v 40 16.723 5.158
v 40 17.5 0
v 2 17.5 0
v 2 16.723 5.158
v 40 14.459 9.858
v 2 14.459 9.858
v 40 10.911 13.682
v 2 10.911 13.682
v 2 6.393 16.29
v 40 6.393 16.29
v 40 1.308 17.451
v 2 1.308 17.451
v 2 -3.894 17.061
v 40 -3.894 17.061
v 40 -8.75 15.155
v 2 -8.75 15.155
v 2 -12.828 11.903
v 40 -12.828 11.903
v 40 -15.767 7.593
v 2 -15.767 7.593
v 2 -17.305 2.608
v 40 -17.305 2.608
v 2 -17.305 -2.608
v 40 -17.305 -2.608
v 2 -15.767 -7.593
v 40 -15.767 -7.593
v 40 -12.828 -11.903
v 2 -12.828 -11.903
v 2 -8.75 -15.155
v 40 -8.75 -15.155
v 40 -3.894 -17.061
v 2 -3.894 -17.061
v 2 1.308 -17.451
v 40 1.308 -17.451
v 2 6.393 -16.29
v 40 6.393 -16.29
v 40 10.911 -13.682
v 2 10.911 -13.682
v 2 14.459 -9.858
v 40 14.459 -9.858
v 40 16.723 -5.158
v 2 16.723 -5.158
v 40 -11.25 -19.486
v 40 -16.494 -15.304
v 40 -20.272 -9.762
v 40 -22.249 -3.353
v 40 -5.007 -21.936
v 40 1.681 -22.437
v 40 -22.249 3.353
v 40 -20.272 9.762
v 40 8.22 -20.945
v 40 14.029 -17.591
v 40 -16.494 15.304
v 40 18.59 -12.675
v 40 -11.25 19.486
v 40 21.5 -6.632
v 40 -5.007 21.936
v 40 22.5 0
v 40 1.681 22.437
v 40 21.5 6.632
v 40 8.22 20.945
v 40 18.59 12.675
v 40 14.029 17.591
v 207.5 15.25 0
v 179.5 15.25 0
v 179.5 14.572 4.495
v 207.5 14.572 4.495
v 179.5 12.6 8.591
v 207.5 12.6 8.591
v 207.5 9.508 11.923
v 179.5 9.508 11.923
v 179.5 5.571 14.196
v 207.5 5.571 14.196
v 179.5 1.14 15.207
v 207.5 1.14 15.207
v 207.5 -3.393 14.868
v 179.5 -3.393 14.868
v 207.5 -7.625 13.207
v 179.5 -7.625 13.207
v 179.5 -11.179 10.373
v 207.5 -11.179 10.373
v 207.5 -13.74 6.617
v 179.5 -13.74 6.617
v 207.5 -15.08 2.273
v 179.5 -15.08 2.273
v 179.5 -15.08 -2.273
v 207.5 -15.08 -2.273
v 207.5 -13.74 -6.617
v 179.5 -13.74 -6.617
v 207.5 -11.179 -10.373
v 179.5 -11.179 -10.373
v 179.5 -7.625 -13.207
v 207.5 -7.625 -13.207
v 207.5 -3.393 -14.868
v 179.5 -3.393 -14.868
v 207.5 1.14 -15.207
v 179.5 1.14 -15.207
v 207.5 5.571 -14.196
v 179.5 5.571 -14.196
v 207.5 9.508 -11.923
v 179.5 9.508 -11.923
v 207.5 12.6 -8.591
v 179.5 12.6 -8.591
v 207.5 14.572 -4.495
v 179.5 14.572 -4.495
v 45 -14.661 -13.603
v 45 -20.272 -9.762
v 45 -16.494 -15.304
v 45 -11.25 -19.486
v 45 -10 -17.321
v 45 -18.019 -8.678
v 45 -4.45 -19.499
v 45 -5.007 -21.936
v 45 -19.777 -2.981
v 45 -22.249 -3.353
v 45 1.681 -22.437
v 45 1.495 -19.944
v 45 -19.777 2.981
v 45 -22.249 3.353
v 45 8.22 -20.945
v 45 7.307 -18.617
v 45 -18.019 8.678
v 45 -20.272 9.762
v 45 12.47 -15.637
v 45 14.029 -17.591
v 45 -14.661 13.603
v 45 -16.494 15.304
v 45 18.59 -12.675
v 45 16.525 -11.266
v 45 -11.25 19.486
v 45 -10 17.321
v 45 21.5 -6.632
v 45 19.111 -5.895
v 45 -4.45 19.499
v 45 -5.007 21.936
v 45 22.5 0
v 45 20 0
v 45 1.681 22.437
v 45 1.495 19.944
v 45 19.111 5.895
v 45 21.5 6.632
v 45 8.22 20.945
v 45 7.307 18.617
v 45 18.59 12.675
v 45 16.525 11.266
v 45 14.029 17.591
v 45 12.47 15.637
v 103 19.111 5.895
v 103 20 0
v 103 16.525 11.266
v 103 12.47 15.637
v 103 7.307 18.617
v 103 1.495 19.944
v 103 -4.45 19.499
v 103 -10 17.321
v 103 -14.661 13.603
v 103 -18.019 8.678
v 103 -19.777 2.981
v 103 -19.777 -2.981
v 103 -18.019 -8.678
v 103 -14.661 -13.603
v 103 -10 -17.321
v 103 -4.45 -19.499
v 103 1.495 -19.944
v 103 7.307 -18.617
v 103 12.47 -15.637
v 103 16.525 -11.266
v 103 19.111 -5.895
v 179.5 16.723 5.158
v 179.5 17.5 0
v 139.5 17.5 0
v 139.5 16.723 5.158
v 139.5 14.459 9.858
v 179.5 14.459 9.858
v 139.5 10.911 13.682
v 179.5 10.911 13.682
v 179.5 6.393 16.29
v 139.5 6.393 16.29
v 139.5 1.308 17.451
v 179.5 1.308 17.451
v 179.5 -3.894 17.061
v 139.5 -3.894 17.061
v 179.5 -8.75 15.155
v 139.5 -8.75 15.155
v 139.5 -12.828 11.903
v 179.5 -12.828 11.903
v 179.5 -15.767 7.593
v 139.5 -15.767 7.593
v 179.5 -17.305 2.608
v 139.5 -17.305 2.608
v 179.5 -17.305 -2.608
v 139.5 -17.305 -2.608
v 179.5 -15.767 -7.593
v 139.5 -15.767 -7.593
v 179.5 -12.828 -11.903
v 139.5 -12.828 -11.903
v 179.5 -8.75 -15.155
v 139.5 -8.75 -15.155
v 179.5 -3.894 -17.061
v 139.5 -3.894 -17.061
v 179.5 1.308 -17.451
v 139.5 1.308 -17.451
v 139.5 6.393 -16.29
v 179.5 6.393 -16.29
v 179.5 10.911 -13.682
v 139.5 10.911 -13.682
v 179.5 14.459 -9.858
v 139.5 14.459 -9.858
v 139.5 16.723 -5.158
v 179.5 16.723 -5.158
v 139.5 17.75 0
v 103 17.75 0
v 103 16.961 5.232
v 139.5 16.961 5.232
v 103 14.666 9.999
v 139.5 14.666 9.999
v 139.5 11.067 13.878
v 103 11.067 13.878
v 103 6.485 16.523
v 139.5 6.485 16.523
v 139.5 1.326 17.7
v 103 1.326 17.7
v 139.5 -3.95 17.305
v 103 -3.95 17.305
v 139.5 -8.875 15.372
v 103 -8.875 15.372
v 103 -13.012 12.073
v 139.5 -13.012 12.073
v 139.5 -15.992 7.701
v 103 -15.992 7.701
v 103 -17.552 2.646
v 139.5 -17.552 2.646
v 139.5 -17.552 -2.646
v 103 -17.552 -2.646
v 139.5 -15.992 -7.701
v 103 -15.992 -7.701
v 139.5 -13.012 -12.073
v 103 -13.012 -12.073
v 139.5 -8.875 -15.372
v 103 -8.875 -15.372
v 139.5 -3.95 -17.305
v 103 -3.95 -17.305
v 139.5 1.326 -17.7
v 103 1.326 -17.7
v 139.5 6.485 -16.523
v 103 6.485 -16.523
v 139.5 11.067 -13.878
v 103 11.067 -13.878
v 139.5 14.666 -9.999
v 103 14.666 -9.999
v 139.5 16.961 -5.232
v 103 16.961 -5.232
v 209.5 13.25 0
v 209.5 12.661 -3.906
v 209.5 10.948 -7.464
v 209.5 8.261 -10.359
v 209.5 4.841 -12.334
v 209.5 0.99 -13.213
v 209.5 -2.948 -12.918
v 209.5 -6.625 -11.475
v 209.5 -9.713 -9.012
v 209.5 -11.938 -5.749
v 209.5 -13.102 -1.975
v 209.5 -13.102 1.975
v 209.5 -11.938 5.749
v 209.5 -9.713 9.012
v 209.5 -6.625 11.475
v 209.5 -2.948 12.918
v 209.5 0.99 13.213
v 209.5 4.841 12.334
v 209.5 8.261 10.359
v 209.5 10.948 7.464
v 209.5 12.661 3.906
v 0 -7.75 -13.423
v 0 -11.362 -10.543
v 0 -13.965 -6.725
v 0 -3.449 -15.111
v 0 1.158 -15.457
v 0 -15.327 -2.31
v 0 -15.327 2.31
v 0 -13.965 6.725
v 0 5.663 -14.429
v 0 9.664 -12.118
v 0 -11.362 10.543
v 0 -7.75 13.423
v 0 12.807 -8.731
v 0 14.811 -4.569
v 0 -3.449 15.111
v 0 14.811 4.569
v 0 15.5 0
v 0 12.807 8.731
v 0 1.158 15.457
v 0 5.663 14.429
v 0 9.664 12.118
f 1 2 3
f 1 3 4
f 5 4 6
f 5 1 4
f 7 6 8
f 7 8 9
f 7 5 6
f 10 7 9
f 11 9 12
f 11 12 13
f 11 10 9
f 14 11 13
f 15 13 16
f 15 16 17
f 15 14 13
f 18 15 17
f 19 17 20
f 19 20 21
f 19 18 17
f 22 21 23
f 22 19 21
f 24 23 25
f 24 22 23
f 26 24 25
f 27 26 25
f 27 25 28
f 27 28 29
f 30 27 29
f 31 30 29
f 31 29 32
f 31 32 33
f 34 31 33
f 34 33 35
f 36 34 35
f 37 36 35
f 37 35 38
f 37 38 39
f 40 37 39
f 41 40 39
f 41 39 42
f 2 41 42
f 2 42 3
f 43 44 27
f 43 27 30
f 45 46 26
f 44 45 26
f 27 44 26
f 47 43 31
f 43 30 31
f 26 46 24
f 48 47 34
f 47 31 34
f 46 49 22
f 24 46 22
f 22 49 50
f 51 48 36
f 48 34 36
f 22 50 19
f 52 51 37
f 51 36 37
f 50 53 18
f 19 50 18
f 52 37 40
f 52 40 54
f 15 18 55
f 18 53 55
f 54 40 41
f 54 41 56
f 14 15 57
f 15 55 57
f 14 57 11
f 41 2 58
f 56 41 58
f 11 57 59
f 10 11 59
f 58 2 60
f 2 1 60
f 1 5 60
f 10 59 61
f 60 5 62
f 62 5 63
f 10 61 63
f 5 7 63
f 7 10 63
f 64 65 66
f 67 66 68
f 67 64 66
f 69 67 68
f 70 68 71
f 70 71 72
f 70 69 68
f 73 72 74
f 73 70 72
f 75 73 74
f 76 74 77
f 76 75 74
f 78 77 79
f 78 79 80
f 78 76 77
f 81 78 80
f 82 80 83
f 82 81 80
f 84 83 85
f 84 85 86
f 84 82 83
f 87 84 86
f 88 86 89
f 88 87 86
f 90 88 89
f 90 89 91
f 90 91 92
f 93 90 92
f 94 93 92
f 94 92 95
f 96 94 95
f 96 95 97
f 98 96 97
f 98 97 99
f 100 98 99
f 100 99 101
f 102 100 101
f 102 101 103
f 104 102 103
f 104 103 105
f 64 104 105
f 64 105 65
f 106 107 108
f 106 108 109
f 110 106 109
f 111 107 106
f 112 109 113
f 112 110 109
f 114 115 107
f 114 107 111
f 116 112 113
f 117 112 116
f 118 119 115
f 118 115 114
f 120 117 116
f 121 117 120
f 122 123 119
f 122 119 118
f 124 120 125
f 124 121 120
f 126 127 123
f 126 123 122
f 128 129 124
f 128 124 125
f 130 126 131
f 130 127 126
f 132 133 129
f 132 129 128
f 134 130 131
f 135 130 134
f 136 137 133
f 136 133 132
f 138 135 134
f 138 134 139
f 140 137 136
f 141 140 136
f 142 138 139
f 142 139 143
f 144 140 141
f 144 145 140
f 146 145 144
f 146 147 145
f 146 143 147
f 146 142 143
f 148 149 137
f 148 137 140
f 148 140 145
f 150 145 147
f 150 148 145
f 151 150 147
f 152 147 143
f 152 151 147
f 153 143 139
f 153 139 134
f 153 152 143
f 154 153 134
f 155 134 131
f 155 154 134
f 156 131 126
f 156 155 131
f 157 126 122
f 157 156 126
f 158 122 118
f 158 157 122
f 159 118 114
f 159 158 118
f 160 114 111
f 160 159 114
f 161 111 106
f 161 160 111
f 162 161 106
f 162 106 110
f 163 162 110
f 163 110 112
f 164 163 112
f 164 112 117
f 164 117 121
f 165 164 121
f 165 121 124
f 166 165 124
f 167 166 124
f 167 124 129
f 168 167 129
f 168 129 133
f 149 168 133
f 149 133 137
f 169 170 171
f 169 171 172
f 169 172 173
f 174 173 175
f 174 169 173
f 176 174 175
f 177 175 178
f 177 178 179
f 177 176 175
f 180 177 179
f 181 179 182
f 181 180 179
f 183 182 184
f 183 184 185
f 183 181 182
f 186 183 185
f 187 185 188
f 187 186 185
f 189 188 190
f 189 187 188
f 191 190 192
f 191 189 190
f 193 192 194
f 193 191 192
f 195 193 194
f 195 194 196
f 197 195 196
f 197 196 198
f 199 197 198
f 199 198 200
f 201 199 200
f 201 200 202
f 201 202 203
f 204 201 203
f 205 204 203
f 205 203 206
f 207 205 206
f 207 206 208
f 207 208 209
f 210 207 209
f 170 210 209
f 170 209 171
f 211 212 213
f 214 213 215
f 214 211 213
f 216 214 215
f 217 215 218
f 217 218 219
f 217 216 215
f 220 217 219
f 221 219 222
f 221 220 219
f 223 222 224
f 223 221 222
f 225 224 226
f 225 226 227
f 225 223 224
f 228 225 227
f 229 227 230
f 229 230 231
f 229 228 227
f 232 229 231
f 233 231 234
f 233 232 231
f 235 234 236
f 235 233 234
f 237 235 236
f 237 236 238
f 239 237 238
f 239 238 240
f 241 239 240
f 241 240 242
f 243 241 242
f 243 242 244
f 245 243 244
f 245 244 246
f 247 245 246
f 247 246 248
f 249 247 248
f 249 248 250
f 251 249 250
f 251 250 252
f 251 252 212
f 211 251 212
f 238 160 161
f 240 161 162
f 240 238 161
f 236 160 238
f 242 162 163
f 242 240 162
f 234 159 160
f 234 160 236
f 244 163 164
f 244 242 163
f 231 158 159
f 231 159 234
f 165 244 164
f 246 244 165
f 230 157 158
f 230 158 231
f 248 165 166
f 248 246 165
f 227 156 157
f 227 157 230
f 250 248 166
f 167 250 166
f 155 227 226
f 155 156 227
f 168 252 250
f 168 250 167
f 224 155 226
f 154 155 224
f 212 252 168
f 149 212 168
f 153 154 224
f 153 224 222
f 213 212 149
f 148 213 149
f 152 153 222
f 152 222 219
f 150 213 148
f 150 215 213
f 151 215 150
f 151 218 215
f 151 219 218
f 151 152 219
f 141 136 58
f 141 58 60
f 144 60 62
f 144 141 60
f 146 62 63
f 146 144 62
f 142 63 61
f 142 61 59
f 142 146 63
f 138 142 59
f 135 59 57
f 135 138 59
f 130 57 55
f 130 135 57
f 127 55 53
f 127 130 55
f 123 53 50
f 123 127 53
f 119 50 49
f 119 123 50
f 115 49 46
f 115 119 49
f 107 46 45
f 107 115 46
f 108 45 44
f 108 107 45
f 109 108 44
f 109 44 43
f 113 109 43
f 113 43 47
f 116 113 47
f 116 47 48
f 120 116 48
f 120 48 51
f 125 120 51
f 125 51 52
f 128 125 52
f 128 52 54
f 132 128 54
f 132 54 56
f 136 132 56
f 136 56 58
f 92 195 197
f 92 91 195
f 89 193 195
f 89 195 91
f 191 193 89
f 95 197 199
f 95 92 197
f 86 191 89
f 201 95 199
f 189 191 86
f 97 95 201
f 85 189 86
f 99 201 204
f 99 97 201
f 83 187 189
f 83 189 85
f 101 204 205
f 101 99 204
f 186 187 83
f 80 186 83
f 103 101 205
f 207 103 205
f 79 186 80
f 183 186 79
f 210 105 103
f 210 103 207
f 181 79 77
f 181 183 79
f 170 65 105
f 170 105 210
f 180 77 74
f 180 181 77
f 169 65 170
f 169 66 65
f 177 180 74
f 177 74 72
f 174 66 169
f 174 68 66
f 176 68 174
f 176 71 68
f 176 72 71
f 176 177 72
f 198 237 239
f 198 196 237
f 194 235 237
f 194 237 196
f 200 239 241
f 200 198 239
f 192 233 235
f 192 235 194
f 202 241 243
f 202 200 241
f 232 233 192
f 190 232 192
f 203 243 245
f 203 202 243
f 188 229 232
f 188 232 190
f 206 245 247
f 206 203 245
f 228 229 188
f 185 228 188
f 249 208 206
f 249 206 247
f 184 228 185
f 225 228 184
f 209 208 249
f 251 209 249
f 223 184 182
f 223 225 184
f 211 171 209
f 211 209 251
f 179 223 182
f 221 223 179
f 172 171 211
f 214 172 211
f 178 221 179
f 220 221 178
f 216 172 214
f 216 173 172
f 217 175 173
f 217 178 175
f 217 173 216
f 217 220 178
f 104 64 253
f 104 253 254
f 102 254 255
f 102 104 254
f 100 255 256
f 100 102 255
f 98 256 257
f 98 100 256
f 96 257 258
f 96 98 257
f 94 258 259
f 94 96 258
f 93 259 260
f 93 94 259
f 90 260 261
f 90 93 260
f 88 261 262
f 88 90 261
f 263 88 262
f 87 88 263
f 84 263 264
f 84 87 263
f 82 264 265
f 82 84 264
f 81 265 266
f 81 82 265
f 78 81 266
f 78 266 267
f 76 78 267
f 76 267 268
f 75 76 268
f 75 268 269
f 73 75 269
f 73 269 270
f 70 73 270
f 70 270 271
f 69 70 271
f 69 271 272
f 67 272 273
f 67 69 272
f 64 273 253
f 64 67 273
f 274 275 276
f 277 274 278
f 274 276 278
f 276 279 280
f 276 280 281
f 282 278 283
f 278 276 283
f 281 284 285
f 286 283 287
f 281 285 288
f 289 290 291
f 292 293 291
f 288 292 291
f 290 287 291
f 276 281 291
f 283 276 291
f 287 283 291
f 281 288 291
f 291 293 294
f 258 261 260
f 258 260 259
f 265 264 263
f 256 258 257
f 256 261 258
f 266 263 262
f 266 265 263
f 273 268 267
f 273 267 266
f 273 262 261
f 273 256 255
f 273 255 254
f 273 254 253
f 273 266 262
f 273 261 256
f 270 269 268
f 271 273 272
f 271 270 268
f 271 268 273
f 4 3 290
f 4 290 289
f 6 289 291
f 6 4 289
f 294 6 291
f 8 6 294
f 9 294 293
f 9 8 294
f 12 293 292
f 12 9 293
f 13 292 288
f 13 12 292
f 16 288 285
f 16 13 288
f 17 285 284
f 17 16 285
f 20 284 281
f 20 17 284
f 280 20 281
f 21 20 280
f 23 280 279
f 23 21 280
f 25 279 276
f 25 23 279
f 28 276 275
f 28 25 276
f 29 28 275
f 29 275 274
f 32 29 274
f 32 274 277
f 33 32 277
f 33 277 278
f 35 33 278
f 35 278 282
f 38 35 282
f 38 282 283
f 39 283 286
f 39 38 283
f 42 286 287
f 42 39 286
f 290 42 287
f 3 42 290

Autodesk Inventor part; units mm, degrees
ref_plane "Start Plane" through (0, 0, 0) normal (1, 0, 0) x (0, 1, 0)
ref_plane "XZ Plane" through (0, 0, 0) normal (0, 1, 0) x (-1, 0, 0)
ref_plane "XY Plane" through (0, 0, 0) normal (0, 0, 1) x (1, 0, 0)
sketch "Main Sketch" plane through (0, 0, 0) normal (0, 0, 1) x (1, 0, 0)
  line L0 (0, 0) -> (209.5, 0)
  line L1 (0, 0) -> (0, 17.5)
  line L2 (0, 17.5) -> (40, 17.5)
  line L3 (40, 17.5) -> (40, 22.5)
  line L4 (45, 22.5) -> (45, 20)
  line L5 (40, 22.5) -> (45, 22.5)
  line L6 (103, 20) -> (103, 17.75)
  line L7 (45, 20) -> (103, 20)
  line L8 (139.5, 17.75) -> (139.5, 17.5)
  line L9 (103, 17.75) -> (139.5, 17.75)
  line L10 (179.5, 17.5) -> (179.5, 15.25)
  line L11 (139.5, 17.5) -> (179.5, 17.5)
  line L12 (209.5, 15.25) -> (209.5, 0)
  line L13 (179.5, 15.25) -> (209.5, 15.25)
  dimension "d3" = 35
  dimension "d4" = 45
  dimension "d5" = 40
  dimension "d6" = 35.5
  dimension "d7" = 35
  dimension "d8" = 30.5
revolve "Revolution1" add sketch "Main Sketch" angle 360 about axis through (0, 0, 0) along (1, 0, 0)
chamfer "Chamfer1" distance 2 angle 45 1 edges at (0, -17.5, 0) measured on face at (26.6667, 17.4433, -1.4082)
chamfer "Chamfer2" distance 2 angle 45 1 edges at (209.5, -15.25, 0) measured on face at (199.5, 15.2005, -1.2271)
equation "\"Length\" = 209.5"
properties part number "Shaft" material "Steel"
